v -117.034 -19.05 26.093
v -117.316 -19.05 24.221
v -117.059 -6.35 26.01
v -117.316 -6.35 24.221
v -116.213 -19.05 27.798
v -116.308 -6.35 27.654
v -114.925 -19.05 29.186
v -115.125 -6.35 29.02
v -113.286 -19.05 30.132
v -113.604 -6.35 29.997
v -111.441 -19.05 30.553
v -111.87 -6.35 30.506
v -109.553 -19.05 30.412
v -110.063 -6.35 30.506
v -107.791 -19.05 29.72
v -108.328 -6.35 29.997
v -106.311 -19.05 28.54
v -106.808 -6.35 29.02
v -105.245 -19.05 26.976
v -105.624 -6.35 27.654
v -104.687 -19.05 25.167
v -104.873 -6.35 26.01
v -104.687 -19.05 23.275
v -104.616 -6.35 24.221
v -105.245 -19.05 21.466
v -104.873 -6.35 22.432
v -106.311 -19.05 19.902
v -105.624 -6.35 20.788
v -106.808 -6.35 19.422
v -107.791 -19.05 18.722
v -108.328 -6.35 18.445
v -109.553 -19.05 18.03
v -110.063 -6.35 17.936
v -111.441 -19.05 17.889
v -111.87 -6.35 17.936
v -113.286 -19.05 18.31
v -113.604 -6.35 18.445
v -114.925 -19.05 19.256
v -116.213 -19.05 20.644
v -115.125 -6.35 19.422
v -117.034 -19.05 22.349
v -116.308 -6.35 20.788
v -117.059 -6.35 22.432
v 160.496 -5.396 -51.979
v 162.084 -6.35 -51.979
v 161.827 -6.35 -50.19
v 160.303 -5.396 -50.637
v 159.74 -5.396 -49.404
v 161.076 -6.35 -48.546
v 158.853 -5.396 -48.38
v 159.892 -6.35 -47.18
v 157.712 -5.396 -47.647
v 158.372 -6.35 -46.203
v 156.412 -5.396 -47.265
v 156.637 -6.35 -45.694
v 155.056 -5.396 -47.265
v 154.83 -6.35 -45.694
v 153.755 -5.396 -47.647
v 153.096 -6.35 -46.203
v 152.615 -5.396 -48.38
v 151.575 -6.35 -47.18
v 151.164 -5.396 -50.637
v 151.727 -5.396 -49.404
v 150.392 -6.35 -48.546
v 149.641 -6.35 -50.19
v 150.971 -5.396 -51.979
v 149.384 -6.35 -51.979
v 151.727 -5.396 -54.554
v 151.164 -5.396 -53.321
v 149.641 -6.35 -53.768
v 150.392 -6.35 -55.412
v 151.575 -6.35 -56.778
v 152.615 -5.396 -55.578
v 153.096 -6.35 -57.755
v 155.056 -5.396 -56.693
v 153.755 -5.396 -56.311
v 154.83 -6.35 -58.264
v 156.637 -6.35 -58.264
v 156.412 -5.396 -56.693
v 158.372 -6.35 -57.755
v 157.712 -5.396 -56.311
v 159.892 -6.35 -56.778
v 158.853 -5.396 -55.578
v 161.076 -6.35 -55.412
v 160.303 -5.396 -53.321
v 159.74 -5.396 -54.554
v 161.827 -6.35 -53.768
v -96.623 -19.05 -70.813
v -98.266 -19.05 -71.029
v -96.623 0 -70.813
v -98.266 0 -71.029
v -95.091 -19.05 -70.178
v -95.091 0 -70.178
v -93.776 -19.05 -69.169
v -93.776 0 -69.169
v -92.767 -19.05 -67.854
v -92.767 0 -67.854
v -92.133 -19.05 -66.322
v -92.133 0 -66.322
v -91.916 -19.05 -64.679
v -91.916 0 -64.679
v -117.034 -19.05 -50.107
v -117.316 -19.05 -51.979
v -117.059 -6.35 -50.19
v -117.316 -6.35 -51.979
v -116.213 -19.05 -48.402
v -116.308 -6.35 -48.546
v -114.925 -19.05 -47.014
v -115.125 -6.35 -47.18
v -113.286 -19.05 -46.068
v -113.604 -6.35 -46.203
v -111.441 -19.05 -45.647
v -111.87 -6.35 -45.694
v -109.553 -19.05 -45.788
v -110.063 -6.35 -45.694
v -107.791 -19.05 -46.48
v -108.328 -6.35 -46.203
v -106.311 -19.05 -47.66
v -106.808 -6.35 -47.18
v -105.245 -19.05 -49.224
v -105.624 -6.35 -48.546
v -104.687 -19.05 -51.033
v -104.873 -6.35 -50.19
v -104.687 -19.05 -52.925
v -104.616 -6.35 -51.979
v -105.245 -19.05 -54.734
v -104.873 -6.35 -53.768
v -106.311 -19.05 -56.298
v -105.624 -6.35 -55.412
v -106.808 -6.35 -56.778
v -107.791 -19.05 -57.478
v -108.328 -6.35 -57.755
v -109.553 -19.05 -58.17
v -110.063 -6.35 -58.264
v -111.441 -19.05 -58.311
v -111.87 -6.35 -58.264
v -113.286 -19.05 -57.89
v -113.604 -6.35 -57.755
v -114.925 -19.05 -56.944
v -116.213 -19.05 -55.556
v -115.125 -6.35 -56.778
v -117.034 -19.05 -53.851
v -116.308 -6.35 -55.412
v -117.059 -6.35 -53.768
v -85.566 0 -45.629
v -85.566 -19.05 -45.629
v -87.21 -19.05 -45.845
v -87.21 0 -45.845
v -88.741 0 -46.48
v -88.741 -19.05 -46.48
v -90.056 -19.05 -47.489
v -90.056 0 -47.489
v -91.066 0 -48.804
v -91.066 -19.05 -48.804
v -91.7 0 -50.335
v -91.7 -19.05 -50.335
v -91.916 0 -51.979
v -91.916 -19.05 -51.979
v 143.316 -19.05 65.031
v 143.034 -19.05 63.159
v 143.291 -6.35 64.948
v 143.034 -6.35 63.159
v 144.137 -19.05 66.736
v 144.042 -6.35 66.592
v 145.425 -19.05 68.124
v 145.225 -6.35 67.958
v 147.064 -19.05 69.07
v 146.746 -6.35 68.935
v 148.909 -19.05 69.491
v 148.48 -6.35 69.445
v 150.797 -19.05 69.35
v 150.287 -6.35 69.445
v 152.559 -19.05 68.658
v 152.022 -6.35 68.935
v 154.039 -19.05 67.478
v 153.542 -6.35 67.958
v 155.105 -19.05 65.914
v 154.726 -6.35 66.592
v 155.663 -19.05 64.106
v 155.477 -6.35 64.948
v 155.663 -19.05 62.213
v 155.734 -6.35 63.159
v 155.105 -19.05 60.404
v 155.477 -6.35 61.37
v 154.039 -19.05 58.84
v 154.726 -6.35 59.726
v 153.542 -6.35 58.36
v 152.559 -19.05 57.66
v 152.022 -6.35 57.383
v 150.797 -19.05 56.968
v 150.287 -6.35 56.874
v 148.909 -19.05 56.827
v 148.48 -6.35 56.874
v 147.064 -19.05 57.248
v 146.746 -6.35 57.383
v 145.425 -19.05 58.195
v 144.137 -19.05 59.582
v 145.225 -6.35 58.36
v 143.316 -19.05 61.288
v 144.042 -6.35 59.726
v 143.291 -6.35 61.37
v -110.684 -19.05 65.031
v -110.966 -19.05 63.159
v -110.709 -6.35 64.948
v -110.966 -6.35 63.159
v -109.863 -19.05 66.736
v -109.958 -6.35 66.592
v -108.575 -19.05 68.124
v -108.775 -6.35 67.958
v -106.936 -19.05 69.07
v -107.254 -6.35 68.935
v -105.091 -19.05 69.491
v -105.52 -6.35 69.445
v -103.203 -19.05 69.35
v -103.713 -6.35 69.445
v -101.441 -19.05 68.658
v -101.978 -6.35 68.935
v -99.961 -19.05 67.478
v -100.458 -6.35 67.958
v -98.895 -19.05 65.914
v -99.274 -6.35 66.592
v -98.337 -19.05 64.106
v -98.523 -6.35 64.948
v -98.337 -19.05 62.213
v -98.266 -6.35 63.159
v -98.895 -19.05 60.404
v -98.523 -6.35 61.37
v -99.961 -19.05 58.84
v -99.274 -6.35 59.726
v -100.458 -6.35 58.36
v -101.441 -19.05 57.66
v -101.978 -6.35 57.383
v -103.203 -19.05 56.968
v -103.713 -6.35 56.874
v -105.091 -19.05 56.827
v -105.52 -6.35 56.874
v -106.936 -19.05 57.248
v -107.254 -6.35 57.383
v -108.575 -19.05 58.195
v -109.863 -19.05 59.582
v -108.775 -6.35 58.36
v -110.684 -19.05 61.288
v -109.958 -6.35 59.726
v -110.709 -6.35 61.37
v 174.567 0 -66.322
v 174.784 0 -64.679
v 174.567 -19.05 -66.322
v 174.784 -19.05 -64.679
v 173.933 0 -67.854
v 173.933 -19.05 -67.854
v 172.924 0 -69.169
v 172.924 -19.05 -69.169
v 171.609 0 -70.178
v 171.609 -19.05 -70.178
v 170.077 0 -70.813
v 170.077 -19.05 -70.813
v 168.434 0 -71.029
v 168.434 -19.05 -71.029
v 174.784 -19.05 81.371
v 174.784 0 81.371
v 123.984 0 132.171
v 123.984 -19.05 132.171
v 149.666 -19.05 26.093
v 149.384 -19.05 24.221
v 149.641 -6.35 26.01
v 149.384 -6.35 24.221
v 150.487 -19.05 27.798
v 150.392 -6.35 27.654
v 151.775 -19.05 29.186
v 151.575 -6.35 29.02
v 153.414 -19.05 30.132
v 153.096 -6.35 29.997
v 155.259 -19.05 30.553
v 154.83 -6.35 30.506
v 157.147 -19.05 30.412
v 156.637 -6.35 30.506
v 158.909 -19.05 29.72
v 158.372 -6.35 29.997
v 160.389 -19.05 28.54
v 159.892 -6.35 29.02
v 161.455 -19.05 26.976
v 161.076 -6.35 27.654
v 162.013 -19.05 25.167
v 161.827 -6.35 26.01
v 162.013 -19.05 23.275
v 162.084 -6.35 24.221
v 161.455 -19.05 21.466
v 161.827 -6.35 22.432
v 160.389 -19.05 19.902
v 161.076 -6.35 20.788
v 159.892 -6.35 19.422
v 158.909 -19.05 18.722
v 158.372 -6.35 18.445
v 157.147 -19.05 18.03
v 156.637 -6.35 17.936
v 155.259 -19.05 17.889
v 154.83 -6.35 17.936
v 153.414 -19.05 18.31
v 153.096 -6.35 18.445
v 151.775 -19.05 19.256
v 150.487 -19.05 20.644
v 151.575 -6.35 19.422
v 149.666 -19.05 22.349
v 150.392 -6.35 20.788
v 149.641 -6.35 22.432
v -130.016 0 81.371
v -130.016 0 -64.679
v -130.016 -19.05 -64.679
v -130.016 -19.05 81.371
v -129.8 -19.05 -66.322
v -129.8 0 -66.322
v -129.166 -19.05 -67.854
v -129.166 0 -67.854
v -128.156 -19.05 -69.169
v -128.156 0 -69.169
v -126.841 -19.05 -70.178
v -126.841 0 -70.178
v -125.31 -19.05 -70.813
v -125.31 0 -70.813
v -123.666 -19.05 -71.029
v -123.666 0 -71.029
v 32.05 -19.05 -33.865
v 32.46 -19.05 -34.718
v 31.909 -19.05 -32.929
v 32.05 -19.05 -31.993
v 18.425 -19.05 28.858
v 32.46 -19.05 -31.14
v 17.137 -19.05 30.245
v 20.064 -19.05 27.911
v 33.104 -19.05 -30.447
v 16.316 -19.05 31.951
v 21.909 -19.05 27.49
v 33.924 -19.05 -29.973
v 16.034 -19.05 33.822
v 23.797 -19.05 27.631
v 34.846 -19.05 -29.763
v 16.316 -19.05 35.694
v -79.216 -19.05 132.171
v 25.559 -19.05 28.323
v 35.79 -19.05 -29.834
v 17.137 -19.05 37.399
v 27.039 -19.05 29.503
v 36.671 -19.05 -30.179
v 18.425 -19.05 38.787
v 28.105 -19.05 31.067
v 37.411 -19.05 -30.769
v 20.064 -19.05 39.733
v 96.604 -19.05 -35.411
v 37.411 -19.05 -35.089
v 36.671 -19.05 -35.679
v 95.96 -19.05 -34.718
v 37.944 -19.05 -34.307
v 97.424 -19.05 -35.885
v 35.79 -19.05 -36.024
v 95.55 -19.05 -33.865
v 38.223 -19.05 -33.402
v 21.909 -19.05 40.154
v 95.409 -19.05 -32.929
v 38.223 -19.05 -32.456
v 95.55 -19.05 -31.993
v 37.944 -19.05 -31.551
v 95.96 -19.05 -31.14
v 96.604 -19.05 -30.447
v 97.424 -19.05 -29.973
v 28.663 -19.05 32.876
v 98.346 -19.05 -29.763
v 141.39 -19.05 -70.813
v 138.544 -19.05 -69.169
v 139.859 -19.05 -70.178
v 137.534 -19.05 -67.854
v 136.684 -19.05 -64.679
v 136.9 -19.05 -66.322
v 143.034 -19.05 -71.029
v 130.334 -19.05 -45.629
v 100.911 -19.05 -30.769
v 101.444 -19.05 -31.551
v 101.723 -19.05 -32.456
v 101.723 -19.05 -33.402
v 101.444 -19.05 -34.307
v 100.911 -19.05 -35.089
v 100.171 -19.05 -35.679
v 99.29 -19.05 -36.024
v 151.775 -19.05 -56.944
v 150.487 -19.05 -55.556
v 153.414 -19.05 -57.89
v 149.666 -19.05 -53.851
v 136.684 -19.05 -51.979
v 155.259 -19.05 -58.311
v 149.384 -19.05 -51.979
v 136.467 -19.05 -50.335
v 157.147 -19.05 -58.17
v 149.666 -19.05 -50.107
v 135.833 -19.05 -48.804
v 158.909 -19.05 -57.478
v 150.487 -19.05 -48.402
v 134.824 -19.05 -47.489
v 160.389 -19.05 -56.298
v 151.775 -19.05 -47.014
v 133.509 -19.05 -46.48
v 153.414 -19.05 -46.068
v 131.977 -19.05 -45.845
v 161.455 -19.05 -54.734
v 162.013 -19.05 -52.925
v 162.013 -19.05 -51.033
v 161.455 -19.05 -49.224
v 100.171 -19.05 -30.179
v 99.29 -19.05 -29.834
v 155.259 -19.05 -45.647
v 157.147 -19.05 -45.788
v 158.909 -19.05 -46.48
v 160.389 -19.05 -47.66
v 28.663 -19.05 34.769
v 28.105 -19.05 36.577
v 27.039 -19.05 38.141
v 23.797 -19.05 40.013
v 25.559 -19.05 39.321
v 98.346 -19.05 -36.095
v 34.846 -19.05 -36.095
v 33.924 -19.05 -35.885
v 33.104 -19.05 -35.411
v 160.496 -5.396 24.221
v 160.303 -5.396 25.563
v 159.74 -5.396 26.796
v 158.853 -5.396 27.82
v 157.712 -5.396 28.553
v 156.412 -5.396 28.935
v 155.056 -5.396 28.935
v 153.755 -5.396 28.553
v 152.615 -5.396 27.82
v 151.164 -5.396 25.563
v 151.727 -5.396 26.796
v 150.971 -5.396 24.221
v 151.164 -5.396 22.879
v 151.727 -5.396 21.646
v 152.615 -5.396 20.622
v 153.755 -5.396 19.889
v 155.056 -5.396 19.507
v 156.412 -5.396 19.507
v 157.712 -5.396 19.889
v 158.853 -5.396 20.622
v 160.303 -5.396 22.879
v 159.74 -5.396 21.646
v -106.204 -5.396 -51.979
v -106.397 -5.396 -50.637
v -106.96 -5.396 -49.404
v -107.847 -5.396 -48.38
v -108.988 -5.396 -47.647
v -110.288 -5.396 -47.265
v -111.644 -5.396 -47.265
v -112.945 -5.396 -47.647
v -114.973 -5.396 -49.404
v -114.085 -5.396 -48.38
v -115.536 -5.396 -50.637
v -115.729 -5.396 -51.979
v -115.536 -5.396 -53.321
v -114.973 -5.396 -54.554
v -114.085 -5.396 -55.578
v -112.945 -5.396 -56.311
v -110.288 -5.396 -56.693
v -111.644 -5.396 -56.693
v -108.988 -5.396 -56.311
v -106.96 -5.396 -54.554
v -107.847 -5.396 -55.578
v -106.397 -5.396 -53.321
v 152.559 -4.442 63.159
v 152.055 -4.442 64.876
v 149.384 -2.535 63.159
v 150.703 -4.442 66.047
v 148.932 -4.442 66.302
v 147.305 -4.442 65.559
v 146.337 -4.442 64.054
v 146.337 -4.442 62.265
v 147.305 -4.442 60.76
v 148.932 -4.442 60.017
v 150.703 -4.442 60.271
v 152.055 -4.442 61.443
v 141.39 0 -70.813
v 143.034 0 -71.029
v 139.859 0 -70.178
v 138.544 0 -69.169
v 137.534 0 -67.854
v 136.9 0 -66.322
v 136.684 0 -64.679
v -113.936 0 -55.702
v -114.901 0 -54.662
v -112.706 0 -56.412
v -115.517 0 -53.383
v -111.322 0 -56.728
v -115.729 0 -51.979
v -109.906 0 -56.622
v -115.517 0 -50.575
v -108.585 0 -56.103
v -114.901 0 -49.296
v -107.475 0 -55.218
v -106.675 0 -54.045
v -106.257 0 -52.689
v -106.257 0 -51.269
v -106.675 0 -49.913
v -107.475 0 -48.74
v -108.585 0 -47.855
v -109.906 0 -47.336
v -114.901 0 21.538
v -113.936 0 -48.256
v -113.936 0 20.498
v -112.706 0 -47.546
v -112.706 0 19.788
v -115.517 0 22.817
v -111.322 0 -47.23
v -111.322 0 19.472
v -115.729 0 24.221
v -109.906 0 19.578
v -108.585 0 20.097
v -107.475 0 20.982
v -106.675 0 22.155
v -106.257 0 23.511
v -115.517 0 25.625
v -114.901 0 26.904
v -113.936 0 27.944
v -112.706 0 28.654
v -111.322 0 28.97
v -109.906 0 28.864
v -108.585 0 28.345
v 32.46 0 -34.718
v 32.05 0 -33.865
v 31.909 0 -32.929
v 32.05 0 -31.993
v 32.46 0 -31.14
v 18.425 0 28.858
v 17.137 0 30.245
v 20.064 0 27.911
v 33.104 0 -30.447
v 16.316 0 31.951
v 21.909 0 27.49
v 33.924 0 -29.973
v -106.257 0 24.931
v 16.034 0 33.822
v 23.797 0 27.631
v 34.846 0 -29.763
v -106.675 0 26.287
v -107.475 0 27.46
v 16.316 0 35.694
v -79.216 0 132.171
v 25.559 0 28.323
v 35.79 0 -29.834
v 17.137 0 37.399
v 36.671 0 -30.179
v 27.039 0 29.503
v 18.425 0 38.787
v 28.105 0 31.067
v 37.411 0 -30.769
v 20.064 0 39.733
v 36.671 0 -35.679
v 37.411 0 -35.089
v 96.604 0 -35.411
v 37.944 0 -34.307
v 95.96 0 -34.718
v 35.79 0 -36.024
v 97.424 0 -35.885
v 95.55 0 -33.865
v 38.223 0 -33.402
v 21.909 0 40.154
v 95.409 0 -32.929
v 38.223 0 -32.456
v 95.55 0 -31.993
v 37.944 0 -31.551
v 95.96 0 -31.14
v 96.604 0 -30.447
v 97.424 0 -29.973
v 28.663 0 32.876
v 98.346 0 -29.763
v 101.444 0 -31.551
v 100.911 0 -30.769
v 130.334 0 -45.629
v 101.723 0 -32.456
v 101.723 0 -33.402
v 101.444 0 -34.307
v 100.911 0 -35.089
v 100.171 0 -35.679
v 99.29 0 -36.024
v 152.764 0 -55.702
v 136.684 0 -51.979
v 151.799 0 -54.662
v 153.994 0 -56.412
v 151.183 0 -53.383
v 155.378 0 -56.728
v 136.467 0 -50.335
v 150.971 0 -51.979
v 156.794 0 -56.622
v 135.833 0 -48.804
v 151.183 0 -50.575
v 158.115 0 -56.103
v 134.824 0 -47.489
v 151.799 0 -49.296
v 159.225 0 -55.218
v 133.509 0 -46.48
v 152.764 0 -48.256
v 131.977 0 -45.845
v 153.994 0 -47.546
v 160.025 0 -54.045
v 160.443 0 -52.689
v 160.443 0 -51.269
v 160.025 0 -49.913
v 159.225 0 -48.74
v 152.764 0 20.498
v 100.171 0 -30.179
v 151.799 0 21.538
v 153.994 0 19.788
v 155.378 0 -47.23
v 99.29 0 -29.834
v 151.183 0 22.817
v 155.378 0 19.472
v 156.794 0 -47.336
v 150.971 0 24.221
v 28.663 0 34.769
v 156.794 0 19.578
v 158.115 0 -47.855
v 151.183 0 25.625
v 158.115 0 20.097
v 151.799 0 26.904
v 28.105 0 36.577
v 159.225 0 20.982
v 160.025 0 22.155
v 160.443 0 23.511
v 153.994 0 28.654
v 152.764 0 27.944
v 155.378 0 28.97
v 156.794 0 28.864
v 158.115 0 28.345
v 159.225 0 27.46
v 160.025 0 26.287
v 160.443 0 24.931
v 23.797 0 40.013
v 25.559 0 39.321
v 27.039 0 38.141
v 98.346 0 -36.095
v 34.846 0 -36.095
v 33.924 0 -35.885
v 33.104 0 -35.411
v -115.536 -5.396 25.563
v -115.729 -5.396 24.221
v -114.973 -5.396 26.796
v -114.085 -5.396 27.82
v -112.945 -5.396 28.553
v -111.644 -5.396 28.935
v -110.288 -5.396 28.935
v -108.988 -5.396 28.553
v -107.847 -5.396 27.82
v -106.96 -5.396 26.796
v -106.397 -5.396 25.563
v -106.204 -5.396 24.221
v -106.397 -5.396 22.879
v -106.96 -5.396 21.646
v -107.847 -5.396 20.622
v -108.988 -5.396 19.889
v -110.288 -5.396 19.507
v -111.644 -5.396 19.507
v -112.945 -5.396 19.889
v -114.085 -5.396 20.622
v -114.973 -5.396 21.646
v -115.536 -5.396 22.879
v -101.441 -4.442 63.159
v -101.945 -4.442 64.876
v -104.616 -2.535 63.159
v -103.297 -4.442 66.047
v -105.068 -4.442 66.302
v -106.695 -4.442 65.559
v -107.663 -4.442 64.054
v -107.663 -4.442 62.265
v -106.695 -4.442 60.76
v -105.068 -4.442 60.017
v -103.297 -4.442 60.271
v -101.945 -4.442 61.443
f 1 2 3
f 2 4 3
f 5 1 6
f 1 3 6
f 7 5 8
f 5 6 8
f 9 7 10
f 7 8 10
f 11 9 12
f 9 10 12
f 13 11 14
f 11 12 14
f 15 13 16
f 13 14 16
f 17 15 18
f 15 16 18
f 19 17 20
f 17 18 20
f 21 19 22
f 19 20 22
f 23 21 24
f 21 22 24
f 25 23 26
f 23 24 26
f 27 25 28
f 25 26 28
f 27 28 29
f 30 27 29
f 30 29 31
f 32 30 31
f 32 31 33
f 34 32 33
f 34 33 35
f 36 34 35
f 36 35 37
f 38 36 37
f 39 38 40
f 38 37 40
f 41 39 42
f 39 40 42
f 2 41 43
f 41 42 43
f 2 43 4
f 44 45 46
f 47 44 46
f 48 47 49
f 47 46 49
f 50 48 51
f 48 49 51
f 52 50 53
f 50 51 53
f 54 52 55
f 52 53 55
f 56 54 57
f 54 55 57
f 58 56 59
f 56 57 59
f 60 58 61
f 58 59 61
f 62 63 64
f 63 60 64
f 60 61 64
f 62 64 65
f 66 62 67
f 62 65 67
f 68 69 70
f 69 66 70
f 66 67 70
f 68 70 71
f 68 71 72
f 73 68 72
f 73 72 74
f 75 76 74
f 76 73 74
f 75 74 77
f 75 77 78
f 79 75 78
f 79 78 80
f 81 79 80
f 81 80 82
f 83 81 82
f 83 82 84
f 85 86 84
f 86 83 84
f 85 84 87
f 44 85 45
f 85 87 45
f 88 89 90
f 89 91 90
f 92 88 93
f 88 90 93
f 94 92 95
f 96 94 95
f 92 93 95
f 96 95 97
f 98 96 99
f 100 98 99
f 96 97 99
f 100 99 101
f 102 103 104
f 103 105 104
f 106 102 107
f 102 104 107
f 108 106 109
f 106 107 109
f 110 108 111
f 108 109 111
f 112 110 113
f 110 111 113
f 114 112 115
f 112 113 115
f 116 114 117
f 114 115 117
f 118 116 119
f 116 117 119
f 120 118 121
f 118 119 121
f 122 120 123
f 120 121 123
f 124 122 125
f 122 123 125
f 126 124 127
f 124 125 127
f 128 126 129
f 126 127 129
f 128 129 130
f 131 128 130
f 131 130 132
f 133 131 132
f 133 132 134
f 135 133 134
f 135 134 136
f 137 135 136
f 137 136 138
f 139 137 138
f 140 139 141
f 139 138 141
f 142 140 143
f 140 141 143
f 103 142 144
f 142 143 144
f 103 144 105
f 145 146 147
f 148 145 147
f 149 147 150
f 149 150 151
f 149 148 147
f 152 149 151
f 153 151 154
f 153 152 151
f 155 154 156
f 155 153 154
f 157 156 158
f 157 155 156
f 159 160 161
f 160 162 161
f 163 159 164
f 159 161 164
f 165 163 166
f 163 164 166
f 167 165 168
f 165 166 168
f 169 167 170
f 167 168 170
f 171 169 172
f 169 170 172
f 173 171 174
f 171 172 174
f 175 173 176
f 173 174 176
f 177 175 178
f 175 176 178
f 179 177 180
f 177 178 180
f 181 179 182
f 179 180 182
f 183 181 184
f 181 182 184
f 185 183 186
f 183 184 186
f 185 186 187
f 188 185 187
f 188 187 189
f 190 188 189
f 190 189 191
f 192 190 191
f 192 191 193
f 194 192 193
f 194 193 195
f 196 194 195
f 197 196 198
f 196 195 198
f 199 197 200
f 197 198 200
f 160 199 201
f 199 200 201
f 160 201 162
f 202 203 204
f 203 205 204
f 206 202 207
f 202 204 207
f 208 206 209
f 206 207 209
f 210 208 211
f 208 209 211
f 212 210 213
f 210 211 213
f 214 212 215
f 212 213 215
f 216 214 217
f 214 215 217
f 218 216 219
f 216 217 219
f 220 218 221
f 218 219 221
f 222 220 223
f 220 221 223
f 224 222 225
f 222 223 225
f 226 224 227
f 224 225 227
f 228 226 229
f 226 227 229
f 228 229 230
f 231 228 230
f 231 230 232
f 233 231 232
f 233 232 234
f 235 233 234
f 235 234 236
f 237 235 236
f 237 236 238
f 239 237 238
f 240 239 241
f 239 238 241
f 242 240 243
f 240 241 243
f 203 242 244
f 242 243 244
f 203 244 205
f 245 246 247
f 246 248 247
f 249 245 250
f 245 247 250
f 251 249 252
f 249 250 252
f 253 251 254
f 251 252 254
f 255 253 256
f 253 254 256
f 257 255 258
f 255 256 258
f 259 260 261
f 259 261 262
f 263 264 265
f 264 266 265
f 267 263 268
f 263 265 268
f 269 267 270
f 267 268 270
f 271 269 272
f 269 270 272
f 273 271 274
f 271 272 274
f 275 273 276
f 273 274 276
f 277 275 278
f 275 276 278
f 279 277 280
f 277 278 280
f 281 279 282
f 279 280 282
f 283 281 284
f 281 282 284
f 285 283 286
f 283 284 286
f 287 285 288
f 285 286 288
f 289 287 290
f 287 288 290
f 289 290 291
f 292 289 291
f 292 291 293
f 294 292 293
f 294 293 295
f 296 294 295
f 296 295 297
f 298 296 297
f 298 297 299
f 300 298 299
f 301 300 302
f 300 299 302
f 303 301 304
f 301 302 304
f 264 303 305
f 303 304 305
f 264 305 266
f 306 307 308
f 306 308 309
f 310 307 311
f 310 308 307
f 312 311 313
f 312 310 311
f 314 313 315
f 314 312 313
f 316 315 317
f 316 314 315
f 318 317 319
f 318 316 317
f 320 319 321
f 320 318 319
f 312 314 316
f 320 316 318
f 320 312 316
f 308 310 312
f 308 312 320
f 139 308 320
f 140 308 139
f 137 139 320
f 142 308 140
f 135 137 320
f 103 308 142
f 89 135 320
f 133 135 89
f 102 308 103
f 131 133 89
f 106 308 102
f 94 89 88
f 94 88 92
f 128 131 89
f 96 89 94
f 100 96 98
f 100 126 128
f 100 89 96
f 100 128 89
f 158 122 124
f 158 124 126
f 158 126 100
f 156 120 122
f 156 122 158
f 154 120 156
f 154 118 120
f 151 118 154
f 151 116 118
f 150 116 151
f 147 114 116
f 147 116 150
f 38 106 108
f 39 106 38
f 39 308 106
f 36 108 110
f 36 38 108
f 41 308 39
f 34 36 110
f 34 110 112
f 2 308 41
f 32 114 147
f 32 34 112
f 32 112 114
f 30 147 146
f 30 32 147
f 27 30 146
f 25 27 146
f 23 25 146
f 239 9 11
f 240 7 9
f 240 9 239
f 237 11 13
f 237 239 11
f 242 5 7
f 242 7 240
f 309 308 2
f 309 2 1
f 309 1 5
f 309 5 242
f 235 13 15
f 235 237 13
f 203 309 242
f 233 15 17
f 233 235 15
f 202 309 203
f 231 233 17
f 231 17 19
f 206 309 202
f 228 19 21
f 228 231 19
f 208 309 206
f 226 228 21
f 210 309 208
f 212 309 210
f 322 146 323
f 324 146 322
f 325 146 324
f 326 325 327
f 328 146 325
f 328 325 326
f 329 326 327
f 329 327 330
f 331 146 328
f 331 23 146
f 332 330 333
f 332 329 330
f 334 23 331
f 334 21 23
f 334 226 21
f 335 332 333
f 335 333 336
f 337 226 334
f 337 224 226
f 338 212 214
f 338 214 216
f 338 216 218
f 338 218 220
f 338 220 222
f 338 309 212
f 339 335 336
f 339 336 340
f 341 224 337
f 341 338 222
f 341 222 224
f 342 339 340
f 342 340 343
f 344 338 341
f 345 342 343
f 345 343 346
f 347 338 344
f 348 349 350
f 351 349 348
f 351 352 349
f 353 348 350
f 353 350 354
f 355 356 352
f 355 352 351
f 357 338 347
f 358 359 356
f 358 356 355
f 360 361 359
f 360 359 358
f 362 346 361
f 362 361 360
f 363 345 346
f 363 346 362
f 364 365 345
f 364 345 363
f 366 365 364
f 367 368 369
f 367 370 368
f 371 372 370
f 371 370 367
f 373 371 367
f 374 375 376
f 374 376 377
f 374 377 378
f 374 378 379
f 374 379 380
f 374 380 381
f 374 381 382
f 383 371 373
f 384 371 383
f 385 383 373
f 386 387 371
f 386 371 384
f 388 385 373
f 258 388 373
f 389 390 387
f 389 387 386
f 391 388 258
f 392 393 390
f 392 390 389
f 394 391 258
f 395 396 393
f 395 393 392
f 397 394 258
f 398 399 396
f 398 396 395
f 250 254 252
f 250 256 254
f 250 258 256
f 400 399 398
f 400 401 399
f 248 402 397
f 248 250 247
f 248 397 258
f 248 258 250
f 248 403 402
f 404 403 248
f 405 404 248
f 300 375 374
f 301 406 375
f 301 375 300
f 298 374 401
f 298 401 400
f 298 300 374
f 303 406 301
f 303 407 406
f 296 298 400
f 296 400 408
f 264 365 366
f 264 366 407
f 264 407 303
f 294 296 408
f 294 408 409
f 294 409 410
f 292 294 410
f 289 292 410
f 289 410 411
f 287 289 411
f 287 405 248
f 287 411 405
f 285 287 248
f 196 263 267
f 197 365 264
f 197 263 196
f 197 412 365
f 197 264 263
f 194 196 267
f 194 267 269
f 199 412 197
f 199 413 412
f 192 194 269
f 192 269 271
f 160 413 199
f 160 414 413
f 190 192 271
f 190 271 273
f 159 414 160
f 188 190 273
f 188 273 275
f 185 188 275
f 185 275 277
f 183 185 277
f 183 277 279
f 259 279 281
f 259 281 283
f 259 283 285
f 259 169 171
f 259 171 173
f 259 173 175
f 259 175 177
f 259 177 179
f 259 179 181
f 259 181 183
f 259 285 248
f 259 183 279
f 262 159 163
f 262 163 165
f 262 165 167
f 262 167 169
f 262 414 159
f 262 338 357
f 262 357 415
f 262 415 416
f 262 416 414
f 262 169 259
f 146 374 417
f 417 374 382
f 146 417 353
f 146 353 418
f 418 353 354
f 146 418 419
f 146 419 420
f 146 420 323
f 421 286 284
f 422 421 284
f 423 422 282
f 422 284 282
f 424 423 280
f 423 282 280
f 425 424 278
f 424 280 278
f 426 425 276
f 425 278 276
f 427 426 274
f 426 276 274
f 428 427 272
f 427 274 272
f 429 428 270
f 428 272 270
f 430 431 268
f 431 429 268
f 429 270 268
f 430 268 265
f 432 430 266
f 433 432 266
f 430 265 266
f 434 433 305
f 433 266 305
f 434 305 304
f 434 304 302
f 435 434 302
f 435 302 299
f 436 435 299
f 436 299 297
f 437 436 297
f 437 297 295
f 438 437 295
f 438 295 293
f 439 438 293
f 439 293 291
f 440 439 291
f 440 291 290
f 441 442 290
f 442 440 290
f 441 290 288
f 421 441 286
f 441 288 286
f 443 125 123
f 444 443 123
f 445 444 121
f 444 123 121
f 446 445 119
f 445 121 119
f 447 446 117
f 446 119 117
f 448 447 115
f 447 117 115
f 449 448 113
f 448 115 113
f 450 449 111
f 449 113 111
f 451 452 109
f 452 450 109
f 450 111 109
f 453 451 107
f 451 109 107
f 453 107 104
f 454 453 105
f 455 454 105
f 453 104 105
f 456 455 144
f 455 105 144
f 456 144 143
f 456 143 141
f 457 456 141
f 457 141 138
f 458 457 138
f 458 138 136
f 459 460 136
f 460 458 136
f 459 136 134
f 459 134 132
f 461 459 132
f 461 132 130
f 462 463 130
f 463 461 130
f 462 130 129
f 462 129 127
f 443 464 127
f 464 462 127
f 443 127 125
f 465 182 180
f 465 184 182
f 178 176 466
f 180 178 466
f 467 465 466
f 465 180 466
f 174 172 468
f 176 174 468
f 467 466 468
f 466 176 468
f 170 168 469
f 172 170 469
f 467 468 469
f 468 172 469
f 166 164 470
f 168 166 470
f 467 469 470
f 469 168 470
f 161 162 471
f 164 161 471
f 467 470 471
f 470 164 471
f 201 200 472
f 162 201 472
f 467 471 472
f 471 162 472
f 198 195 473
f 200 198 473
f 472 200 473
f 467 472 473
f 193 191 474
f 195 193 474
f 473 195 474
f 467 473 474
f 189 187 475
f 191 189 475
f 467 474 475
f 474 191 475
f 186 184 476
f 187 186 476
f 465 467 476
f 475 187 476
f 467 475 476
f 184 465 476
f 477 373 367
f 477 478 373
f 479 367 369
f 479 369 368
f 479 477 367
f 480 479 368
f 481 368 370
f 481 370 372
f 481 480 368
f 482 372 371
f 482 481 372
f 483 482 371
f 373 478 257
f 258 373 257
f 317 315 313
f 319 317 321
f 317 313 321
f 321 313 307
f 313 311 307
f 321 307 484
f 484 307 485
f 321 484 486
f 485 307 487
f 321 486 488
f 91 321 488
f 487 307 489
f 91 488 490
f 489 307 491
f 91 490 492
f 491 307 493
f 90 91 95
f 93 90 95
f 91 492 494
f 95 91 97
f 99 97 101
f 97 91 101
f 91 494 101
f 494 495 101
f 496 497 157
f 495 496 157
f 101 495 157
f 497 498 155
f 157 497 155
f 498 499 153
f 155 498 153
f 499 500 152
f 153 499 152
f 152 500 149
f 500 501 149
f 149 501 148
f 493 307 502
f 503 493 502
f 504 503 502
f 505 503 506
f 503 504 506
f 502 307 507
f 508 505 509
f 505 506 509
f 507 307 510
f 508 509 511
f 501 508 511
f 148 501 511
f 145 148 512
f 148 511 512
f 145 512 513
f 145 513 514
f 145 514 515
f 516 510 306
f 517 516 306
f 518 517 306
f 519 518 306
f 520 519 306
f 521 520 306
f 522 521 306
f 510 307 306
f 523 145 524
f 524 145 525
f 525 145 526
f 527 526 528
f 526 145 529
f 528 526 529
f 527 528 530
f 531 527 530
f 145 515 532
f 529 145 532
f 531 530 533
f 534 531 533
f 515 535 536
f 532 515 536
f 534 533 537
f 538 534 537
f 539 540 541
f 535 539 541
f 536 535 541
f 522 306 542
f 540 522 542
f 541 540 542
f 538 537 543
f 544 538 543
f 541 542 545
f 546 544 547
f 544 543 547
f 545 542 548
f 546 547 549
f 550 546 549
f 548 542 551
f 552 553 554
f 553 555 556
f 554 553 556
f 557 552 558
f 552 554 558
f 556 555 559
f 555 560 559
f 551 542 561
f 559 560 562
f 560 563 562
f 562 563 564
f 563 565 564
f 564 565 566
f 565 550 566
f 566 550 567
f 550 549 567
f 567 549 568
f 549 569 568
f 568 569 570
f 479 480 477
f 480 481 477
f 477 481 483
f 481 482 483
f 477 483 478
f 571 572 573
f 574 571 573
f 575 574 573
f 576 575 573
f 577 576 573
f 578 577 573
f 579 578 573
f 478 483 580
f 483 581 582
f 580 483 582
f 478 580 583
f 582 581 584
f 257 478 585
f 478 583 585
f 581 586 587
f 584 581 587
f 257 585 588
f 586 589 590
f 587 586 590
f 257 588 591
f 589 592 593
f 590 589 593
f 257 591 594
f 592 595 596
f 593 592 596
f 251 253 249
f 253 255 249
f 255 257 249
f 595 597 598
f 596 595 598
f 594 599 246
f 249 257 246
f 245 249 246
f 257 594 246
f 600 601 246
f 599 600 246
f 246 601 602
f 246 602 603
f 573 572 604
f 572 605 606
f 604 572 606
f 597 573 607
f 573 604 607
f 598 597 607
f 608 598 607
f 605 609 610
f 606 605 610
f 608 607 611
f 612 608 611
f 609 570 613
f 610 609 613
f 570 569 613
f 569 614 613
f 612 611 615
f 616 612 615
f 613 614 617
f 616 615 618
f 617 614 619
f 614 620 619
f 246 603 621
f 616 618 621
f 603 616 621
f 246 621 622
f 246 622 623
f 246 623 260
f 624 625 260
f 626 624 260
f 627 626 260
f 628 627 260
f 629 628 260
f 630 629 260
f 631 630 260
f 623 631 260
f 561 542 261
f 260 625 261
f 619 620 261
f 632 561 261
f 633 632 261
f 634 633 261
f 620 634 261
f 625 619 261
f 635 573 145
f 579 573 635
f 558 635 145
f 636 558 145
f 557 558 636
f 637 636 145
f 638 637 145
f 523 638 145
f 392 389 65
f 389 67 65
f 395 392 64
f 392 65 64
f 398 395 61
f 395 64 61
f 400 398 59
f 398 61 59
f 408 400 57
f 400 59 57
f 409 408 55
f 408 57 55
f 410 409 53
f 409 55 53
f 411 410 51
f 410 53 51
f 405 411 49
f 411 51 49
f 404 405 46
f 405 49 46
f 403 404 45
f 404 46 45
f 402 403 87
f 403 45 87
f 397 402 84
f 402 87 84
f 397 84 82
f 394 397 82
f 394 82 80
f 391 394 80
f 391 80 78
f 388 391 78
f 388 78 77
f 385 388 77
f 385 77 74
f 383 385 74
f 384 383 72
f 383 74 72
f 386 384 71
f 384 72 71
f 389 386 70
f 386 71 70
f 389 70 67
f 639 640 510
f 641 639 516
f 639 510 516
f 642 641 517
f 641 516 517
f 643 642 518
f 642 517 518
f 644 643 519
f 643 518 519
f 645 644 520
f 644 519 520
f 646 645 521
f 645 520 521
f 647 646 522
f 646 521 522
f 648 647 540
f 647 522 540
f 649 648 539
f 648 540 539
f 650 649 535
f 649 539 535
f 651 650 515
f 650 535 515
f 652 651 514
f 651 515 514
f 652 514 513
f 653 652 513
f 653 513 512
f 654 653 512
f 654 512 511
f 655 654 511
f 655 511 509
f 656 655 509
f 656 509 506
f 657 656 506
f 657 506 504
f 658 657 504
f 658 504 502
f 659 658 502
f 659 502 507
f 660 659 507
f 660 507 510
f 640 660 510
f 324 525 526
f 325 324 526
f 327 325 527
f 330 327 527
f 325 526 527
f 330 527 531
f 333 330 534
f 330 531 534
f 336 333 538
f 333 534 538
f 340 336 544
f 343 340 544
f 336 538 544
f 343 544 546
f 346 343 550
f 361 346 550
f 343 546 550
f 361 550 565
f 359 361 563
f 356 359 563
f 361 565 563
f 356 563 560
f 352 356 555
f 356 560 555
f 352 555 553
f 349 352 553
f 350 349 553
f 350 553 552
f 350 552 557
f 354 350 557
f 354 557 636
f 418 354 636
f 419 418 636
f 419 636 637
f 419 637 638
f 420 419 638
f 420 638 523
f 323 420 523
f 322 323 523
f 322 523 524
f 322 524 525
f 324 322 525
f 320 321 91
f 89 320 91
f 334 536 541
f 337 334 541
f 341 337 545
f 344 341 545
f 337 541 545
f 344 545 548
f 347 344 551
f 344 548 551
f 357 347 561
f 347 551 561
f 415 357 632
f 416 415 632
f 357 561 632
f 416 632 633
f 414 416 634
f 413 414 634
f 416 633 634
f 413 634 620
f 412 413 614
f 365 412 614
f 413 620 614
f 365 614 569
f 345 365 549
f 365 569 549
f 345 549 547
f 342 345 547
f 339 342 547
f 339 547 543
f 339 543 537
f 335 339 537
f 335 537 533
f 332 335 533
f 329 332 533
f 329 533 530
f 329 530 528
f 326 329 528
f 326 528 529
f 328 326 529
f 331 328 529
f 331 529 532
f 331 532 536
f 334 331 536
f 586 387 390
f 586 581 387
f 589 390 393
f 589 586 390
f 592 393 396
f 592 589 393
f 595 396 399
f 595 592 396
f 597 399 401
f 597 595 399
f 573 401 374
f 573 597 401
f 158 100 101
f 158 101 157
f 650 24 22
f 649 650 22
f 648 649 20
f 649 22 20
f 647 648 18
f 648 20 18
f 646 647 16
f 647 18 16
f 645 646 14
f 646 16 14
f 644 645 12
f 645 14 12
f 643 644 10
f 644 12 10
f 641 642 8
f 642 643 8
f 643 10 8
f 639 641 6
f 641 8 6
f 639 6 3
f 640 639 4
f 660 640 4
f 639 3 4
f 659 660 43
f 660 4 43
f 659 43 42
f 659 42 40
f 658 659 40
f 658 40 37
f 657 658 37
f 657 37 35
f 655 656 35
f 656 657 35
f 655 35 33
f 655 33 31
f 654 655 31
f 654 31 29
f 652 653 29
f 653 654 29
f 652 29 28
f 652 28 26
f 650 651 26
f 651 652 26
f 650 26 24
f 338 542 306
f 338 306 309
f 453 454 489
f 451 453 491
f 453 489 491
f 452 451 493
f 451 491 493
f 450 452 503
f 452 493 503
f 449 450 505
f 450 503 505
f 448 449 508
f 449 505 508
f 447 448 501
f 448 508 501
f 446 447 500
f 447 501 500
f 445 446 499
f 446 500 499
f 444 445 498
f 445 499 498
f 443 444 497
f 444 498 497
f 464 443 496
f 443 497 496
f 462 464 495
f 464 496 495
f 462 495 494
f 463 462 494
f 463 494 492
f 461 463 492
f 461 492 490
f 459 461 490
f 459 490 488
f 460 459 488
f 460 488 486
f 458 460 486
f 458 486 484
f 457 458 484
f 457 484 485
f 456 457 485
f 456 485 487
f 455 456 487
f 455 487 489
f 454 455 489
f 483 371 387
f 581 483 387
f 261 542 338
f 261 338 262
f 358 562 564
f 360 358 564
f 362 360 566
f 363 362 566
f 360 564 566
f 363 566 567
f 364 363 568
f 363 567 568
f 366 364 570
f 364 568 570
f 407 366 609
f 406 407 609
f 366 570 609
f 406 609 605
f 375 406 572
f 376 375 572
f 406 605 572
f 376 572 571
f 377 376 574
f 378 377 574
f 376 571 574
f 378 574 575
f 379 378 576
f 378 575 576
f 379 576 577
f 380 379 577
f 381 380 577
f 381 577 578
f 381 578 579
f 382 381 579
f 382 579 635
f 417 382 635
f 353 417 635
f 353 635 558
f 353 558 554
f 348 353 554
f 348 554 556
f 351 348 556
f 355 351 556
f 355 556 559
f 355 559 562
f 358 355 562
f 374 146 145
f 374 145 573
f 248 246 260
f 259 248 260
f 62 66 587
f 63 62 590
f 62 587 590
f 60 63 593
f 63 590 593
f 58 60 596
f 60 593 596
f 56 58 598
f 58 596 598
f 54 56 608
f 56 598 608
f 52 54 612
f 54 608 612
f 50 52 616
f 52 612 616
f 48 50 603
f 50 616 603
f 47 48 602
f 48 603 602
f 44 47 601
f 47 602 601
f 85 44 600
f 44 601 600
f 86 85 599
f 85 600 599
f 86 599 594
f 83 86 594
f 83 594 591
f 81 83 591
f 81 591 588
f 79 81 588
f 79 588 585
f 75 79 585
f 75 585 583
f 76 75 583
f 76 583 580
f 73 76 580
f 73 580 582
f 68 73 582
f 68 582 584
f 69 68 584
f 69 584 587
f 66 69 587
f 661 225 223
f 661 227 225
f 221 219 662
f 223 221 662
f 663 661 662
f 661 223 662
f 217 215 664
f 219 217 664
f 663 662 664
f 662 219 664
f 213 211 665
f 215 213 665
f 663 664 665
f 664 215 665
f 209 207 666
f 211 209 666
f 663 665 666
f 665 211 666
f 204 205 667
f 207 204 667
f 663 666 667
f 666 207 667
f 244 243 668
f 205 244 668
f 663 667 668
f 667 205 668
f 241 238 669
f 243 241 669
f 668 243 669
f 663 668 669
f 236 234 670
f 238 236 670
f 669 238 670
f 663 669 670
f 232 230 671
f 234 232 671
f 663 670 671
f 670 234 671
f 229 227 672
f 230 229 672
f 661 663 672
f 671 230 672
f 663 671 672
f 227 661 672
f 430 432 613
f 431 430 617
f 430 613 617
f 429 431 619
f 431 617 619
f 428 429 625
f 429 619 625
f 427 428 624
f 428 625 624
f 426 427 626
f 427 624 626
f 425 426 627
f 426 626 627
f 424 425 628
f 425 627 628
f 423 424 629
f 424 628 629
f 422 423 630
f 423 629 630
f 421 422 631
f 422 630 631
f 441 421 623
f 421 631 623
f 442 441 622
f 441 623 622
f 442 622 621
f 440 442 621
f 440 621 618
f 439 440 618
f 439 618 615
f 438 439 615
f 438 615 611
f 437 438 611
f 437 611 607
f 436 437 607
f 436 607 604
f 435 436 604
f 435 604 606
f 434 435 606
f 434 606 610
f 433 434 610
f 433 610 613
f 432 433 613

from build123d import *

# Parameters (mm, degrees)
F0_W     = 304.8
F0_H     = 203.2
F1_DEPTH = 19.05
F2_SIZE  = 50.8
F3_W     = 228.6
F3_H     = 25.4
F4_DEPTH = 19.05
F5_R     = 6.35
F7_D     = 6.35
F8_D     = 12.7
F8_DEPTH = 12.7
F8_TIP   = 3.8154649308
F9_D     = 9.525
F10_D    = 12.7


with BuildPart() as f1:
    # F0 (on Front) → F1 (new body)
    with BuildSketch(Plane.XZ):
        with Locations((22.3837513477, 30.5710117506)):
            Rectangle(F0_W, F0_H)
    extrude(amount=F1_DEPTH)

    # F2
    f2_edges = [f1.edges().sort_by_distance(p)[0] for p in [
        (-130.016249, -9.525, 132.171012),
        (174.783751, -9.525, 132.171012),
    ]]
    chamfer(f2_edges, length=F2_SIZE)

    # F3 (on face) → F4 (cut)
    with BuildSketch(Plane.XZ.offset(19.05)):
        with Locations((22.3837513477, -58.3289882494)):
            Rectangle(F3_W, F3_H)
    extrude(amount=-F4_DEPTH, mode=Mode.SUBTRACT)

    # F5
    f5_edges = [f1.edges().sort_by_distance(p)[0] for p in [
        (-130.016249, -9.525, -71.028988),
        (-91.916249, -9.525, -71.028988),
        (-91.916249, -9.525, -45.628988),
        (136.683751, -9.525, -71.028988),
        (174.783751, -9.525, -71.028988),
        (136.683751, -9.525, -45.628988),
    ]]
    fillet(f5_edges, radius=F5_R)

    # F7 (through all)
    with Locations(Plane.XZ.offset(19.05)):
        with Locations((98.5837513477, -32.9289882494), (35.0837513477, -32.9289882494)):
            Hole(F7_D / 2)

    # F8
    with Locations(Plane.XZ.offset(19.05)):
        with Locations((-104.6162486523, 63.1592117506), (149.3837513477, 63.1592117506), (-110.9662486523, 24.2210117506), (155.7337513477, 24.2210117506), (155.7337513477, -51.9789882494), (-110.9662486523, -51.9789882494)):
            Hole(F8_D / 2, depth=F8_DEPTH)
            with Locations((0, 0, -(F8_DEPTH + F8_TIP / 2))):  # 118° drill point
                Cone(0, F8_D / 2, F8_TIP, mode=Mode.SUBTRACT)

    # F9 (through all)
    with Locations(Plane.XZ.offset(19.05)):
        with Locations((-110.9662486523, 24.2210117506), (155.7337513477, 24.2210117506), (155.7337513477, -51.9789882494), (-110.9662486523, -51.9789882494)):
            Hole(F9_D / 2)

    # F10 (through all)
    with Locations(Plane.XZ.offset(19.05)):
        with Locations((22.3837513477, 33.8222117506)):
            Hole(F10_D / 2)


solid = f1.part
